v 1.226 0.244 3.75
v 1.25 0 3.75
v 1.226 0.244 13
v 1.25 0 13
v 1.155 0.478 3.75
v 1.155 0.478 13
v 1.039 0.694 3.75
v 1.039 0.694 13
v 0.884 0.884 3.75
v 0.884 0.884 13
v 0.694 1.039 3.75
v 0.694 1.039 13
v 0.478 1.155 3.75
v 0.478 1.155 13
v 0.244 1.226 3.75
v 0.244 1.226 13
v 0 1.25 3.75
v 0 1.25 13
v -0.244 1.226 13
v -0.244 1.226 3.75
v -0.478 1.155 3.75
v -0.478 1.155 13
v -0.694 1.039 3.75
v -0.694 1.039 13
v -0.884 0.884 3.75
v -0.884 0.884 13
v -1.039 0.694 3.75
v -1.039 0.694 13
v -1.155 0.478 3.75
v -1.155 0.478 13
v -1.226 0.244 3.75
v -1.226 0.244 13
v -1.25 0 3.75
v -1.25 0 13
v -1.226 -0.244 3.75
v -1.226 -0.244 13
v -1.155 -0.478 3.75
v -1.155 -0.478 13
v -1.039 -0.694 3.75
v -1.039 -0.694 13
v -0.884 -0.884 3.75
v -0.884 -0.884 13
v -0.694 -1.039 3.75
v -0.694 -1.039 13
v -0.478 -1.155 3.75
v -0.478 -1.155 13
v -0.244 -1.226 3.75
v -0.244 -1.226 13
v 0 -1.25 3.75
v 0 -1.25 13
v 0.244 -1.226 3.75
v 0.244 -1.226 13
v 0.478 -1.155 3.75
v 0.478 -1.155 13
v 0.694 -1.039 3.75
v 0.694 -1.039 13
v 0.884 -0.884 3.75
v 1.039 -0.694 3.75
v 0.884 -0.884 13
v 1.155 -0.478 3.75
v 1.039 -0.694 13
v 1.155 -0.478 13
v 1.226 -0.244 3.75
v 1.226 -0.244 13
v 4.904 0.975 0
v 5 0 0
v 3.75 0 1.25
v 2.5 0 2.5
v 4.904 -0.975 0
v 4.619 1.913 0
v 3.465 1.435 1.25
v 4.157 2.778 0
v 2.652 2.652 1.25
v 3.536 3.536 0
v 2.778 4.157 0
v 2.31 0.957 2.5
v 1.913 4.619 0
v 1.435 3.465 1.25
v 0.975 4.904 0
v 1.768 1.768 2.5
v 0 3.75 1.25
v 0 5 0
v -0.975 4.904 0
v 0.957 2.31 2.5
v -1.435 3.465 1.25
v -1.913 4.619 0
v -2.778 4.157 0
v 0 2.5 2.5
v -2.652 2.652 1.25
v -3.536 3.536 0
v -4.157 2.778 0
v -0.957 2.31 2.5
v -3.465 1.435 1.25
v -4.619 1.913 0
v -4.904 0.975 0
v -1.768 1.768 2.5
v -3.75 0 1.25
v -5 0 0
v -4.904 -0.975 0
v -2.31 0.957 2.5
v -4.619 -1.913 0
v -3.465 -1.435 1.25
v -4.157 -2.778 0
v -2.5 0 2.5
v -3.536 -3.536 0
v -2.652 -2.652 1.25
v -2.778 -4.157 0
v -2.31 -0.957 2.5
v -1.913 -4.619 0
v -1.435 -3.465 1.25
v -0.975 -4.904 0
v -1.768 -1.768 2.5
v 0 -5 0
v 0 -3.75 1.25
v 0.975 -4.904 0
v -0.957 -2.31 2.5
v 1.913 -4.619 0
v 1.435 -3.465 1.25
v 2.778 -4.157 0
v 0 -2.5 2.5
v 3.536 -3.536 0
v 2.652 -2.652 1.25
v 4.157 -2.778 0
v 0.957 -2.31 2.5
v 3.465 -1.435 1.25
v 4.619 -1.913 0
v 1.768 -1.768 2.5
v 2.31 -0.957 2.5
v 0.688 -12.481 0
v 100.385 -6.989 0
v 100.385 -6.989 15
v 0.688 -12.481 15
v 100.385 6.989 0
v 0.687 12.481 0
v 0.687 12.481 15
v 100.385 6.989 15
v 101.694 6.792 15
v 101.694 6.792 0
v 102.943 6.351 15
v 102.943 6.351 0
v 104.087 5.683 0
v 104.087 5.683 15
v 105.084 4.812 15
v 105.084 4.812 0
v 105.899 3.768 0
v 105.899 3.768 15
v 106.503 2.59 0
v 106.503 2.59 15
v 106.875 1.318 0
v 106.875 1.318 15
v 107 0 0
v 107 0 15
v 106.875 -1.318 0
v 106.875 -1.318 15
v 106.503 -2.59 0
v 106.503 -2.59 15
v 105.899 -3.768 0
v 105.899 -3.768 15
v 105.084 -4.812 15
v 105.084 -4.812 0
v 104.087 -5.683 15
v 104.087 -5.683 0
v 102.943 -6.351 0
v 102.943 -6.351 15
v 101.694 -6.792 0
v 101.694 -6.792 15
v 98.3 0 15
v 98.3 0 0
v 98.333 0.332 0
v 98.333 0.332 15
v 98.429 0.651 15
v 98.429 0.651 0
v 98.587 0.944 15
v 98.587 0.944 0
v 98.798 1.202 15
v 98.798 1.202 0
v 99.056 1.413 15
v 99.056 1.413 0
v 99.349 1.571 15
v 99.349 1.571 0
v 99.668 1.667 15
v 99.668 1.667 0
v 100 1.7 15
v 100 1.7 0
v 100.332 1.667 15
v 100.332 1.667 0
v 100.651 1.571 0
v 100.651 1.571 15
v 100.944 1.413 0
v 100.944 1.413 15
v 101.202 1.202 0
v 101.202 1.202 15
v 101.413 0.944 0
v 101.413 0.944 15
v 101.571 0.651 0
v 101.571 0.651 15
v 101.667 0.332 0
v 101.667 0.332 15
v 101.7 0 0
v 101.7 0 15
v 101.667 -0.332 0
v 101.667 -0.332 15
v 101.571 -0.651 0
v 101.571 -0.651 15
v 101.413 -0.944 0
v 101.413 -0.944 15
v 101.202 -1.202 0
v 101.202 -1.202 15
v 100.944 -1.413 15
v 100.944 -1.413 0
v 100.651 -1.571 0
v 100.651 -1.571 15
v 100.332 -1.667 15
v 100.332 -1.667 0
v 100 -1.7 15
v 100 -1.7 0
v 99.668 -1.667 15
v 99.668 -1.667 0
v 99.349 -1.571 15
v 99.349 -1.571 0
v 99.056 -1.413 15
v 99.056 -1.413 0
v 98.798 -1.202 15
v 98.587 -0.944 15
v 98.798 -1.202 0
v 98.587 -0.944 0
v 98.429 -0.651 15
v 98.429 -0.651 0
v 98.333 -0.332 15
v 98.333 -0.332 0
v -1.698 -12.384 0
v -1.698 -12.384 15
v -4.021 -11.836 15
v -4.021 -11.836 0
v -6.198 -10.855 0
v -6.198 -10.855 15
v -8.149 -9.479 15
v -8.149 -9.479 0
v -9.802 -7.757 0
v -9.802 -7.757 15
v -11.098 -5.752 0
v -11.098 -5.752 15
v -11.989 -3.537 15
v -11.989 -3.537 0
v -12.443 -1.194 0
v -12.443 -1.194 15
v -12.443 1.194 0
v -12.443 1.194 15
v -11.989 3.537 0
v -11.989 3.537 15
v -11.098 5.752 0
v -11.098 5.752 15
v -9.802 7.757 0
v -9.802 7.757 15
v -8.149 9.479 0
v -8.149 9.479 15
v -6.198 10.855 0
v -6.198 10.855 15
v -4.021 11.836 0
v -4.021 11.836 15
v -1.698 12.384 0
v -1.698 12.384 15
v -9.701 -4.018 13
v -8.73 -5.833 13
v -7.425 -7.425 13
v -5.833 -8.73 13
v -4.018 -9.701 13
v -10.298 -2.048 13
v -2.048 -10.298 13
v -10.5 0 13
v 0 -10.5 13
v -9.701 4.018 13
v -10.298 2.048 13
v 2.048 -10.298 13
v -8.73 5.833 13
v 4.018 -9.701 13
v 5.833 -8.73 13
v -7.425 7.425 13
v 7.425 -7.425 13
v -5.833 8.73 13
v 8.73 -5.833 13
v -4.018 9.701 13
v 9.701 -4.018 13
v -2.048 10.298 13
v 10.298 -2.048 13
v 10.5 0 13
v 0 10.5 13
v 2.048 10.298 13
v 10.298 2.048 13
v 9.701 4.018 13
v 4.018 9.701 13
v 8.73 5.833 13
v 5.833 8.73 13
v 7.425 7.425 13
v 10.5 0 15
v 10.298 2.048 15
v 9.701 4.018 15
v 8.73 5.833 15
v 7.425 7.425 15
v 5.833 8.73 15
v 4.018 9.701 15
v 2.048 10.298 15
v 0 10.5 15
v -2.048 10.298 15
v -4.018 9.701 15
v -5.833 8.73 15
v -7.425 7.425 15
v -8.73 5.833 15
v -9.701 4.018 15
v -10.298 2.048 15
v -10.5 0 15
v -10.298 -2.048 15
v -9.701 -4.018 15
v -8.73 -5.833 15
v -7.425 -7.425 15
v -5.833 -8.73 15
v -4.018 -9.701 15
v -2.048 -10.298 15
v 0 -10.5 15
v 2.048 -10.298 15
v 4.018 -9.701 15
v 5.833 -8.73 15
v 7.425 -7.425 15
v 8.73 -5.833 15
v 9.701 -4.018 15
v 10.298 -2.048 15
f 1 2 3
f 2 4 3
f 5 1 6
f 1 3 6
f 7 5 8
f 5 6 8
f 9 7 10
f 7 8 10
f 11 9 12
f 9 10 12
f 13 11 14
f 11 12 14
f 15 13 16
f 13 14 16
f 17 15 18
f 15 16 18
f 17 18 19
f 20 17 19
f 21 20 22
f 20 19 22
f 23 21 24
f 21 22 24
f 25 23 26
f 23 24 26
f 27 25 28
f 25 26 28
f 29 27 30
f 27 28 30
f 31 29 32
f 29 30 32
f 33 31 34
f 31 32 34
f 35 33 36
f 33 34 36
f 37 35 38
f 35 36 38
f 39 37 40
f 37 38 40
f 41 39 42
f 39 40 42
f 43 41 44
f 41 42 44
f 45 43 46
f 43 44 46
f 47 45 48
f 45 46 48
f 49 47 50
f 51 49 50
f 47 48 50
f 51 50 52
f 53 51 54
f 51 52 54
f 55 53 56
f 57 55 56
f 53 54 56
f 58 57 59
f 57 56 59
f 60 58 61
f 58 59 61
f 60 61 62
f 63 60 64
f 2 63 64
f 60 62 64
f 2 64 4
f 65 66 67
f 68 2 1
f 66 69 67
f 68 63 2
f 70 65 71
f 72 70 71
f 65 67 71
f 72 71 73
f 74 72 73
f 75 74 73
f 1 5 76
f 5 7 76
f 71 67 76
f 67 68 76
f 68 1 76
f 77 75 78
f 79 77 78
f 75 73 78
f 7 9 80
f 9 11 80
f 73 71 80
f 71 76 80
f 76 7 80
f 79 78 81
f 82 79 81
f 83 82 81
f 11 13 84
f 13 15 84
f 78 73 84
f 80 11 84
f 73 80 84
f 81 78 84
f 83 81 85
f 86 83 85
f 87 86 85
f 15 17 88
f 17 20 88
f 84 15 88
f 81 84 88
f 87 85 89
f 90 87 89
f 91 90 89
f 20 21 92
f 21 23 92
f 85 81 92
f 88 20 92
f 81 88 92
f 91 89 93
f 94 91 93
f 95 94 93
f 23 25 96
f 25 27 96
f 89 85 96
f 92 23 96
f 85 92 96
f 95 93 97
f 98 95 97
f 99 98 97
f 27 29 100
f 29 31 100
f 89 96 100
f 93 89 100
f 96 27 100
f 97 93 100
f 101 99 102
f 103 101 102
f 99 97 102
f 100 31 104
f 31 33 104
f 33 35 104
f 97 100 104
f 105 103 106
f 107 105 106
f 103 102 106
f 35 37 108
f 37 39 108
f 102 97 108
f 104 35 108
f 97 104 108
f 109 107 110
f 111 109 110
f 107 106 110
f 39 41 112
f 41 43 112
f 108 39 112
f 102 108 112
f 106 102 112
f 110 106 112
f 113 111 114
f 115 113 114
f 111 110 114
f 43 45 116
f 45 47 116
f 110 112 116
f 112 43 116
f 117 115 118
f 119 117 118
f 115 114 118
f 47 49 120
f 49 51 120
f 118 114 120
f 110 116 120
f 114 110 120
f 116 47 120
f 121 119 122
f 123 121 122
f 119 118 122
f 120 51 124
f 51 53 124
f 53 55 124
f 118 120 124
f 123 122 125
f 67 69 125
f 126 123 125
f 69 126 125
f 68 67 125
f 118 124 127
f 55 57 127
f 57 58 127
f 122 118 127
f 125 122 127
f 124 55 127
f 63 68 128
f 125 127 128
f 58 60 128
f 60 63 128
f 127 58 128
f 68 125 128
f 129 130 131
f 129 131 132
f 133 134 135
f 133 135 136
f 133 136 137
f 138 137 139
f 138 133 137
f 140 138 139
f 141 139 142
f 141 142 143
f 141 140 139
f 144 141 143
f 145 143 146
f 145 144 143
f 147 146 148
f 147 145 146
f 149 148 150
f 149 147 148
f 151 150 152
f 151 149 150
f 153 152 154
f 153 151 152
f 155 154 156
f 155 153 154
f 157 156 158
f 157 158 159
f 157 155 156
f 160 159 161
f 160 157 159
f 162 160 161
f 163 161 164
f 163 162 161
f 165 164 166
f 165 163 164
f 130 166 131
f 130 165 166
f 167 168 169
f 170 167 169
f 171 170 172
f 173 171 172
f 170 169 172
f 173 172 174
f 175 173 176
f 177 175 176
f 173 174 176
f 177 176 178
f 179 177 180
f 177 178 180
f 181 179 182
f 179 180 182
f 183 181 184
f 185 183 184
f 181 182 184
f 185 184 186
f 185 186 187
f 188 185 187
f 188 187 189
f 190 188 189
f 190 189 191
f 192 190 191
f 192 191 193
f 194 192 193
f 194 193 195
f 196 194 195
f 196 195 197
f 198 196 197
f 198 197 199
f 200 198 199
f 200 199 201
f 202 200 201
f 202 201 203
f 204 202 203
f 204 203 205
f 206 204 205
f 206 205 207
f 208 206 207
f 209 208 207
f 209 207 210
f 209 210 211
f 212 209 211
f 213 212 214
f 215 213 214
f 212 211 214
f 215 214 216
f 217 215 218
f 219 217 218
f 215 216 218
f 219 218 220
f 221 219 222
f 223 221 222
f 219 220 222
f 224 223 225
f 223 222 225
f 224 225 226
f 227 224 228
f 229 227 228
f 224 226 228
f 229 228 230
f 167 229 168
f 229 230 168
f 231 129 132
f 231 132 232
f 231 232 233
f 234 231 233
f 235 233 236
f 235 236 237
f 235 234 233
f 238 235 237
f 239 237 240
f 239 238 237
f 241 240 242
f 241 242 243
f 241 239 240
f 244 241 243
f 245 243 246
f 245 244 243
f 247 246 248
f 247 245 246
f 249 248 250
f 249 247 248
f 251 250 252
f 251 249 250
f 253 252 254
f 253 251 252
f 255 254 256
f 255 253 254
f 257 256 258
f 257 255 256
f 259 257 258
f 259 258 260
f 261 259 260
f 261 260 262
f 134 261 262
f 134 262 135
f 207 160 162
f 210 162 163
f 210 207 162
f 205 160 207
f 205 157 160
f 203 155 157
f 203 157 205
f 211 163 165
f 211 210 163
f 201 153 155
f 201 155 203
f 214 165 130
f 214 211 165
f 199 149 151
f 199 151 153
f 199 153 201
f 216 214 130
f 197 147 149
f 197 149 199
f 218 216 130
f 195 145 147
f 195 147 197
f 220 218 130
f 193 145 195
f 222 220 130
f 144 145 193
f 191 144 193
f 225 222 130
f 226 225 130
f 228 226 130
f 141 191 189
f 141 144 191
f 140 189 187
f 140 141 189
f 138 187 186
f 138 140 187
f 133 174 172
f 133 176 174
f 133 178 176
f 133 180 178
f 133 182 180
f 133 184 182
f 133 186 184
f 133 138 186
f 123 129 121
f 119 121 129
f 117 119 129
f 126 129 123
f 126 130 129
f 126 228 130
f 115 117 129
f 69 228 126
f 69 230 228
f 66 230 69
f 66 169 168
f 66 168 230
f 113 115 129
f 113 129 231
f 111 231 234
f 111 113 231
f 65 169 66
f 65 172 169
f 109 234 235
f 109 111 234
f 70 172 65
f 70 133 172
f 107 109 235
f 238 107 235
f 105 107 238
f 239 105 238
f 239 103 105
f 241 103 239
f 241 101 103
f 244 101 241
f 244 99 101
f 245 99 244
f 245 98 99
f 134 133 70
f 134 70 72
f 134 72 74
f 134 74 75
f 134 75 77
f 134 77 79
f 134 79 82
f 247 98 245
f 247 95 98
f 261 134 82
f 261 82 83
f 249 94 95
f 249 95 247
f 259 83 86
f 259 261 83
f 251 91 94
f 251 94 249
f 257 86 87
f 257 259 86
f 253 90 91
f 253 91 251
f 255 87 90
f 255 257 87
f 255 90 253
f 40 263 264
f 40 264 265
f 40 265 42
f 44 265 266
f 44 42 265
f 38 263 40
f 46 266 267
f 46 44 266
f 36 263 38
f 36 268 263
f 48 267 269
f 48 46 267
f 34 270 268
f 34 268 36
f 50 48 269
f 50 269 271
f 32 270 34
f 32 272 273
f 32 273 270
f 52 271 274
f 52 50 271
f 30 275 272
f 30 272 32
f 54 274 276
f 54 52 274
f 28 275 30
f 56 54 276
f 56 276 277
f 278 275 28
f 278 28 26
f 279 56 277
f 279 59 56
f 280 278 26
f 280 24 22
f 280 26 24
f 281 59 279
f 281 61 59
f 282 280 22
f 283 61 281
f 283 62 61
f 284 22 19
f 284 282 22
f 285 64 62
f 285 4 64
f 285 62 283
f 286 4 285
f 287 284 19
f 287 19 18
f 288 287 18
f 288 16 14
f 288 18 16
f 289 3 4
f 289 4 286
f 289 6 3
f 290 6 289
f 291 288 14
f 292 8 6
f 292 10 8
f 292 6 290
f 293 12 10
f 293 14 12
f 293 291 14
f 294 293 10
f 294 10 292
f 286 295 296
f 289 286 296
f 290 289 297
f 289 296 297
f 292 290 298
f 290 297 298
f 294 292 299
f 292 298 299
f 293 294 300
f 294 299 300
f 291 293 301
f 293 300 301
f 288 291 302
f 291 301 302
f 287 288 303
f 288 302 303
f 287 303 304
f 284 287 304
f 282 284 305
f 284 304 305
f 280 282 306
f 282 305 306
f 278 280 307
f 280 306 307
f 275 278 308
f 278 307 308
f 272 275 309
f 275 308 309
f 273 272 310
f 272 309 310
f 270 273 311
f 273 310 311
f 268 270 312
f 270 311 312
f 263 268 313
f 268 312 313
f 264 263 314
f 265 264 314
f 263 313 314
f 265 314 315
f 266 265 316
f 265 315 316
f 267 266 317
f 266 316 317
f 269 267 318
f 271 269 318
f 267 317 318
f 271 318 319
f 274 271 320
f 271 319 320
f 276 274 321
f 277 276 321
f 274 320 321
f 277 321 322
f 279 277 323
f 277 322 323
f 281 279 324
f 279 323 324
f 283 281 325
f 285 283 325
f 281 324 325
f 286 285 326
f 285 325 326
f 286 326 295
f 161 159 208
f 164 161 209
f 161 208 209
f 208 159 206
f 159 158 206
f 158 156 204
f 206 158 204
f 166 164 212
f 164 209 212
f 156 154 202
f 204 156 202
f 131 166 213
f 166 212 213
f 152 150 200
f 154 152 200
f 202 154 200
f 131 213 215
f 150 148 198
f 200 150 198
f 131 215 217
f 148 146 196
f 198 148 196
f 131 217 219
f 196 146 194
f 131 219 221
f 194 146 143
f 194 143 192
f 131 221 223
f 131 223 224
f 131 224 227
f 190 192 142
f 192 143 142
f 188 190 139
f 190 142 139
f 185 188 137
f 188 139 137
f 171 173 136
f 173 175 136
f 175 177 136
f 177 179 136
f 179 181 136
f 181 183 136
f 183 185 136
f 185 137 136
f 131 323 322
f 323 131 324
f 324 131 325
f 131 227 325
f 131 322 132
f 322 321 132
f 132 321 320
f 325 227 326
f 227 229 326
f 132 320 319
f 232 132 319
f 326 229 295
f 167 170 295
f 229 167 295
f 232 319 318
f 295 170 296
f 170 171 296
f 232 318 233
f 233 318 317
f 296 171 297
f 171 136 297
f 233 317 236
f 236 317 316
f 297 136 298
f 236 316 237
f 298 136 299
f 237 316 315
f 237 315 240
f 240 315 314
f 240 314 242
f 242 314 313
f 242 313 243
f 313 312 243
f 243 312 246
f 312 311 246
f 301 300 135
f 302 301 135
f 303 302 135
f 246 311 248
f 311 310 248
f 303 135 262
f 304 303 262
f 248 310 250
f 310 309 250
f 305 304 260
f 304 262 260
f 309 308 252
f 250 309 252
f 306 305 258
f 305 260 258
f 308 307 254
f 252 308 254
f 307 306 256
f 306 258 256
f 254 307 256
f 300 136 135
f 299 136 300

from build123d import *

# Parameters (mm, degrees)
BOSS_EXTRUDE1_DEPTH             = 15
SKETCH4_R                       = 10.5
CUT_EXTRUDE2_DEPTH              = 2
M3_CLEARANCE_HOLE2_D            = 3.4
M3X0_5_TAPPED_HOLE1_D           = 2.5
M3X0_5_TAPPED_HOLE1_CSINK_D     = 10
M3X0_5_TAPPED_HOLE1_CSINK_ANGLE = 90


with BuildPart() as part:
    # Sketch1 → Boss-Extrude1 (new body)
    with BuildSketch(Plane.XY):
        with BuildLine():
            Line((0.6875, 12.48107943), (100.385, 6.989404481))
            ThreePointArc((100.385, 6.989404481), (107, 0), (100.385, -6.989404481))
            Line((100.385, -6.989404481), (0.6875, -12.48107943))
            ThreePointArc((0.6875, -12.48107943), (-12.5, 0), (0.6875, 12.48107943))
        make_face()
    extrude(amount=BOSS_EXTRUDE1_DEPTH)

    # Sketch4 → Cut-Extrude2 (cut)
    with BuildSketch(Plane.XY.offset(15)):
        Circle(SKETCH4_R)
    extrude(amount=-CUT_EXTRUDE2_DEPTH, mode=Mode.SUBTRACT)

    # M3 Clearance Hole2 (through all)
    with Locations(Plane.XY.offset(15)):
        with Locations((100, 0)):
            Hole(M3_CLEARANCE_HOLE2_D / 2)

    # M3x0.5 Tapped Hole1 (through all)
    with Locations(Plane(origin=(0, 0, 0), x_dir=(-1, 0, 0), z_dir=(0, 0, -1))):
        with Locations((0, 0)):
            CounterSinkHole(M3X0_5_TAPPED_HOLE1_D / 2, M3X0_5_TAPPED_HOLE1_CSINK_D / 2, counter_sink_angle=M3X0_5_TAPPED_HOLE1_CSINK_ANGLE)


solid = part.part
